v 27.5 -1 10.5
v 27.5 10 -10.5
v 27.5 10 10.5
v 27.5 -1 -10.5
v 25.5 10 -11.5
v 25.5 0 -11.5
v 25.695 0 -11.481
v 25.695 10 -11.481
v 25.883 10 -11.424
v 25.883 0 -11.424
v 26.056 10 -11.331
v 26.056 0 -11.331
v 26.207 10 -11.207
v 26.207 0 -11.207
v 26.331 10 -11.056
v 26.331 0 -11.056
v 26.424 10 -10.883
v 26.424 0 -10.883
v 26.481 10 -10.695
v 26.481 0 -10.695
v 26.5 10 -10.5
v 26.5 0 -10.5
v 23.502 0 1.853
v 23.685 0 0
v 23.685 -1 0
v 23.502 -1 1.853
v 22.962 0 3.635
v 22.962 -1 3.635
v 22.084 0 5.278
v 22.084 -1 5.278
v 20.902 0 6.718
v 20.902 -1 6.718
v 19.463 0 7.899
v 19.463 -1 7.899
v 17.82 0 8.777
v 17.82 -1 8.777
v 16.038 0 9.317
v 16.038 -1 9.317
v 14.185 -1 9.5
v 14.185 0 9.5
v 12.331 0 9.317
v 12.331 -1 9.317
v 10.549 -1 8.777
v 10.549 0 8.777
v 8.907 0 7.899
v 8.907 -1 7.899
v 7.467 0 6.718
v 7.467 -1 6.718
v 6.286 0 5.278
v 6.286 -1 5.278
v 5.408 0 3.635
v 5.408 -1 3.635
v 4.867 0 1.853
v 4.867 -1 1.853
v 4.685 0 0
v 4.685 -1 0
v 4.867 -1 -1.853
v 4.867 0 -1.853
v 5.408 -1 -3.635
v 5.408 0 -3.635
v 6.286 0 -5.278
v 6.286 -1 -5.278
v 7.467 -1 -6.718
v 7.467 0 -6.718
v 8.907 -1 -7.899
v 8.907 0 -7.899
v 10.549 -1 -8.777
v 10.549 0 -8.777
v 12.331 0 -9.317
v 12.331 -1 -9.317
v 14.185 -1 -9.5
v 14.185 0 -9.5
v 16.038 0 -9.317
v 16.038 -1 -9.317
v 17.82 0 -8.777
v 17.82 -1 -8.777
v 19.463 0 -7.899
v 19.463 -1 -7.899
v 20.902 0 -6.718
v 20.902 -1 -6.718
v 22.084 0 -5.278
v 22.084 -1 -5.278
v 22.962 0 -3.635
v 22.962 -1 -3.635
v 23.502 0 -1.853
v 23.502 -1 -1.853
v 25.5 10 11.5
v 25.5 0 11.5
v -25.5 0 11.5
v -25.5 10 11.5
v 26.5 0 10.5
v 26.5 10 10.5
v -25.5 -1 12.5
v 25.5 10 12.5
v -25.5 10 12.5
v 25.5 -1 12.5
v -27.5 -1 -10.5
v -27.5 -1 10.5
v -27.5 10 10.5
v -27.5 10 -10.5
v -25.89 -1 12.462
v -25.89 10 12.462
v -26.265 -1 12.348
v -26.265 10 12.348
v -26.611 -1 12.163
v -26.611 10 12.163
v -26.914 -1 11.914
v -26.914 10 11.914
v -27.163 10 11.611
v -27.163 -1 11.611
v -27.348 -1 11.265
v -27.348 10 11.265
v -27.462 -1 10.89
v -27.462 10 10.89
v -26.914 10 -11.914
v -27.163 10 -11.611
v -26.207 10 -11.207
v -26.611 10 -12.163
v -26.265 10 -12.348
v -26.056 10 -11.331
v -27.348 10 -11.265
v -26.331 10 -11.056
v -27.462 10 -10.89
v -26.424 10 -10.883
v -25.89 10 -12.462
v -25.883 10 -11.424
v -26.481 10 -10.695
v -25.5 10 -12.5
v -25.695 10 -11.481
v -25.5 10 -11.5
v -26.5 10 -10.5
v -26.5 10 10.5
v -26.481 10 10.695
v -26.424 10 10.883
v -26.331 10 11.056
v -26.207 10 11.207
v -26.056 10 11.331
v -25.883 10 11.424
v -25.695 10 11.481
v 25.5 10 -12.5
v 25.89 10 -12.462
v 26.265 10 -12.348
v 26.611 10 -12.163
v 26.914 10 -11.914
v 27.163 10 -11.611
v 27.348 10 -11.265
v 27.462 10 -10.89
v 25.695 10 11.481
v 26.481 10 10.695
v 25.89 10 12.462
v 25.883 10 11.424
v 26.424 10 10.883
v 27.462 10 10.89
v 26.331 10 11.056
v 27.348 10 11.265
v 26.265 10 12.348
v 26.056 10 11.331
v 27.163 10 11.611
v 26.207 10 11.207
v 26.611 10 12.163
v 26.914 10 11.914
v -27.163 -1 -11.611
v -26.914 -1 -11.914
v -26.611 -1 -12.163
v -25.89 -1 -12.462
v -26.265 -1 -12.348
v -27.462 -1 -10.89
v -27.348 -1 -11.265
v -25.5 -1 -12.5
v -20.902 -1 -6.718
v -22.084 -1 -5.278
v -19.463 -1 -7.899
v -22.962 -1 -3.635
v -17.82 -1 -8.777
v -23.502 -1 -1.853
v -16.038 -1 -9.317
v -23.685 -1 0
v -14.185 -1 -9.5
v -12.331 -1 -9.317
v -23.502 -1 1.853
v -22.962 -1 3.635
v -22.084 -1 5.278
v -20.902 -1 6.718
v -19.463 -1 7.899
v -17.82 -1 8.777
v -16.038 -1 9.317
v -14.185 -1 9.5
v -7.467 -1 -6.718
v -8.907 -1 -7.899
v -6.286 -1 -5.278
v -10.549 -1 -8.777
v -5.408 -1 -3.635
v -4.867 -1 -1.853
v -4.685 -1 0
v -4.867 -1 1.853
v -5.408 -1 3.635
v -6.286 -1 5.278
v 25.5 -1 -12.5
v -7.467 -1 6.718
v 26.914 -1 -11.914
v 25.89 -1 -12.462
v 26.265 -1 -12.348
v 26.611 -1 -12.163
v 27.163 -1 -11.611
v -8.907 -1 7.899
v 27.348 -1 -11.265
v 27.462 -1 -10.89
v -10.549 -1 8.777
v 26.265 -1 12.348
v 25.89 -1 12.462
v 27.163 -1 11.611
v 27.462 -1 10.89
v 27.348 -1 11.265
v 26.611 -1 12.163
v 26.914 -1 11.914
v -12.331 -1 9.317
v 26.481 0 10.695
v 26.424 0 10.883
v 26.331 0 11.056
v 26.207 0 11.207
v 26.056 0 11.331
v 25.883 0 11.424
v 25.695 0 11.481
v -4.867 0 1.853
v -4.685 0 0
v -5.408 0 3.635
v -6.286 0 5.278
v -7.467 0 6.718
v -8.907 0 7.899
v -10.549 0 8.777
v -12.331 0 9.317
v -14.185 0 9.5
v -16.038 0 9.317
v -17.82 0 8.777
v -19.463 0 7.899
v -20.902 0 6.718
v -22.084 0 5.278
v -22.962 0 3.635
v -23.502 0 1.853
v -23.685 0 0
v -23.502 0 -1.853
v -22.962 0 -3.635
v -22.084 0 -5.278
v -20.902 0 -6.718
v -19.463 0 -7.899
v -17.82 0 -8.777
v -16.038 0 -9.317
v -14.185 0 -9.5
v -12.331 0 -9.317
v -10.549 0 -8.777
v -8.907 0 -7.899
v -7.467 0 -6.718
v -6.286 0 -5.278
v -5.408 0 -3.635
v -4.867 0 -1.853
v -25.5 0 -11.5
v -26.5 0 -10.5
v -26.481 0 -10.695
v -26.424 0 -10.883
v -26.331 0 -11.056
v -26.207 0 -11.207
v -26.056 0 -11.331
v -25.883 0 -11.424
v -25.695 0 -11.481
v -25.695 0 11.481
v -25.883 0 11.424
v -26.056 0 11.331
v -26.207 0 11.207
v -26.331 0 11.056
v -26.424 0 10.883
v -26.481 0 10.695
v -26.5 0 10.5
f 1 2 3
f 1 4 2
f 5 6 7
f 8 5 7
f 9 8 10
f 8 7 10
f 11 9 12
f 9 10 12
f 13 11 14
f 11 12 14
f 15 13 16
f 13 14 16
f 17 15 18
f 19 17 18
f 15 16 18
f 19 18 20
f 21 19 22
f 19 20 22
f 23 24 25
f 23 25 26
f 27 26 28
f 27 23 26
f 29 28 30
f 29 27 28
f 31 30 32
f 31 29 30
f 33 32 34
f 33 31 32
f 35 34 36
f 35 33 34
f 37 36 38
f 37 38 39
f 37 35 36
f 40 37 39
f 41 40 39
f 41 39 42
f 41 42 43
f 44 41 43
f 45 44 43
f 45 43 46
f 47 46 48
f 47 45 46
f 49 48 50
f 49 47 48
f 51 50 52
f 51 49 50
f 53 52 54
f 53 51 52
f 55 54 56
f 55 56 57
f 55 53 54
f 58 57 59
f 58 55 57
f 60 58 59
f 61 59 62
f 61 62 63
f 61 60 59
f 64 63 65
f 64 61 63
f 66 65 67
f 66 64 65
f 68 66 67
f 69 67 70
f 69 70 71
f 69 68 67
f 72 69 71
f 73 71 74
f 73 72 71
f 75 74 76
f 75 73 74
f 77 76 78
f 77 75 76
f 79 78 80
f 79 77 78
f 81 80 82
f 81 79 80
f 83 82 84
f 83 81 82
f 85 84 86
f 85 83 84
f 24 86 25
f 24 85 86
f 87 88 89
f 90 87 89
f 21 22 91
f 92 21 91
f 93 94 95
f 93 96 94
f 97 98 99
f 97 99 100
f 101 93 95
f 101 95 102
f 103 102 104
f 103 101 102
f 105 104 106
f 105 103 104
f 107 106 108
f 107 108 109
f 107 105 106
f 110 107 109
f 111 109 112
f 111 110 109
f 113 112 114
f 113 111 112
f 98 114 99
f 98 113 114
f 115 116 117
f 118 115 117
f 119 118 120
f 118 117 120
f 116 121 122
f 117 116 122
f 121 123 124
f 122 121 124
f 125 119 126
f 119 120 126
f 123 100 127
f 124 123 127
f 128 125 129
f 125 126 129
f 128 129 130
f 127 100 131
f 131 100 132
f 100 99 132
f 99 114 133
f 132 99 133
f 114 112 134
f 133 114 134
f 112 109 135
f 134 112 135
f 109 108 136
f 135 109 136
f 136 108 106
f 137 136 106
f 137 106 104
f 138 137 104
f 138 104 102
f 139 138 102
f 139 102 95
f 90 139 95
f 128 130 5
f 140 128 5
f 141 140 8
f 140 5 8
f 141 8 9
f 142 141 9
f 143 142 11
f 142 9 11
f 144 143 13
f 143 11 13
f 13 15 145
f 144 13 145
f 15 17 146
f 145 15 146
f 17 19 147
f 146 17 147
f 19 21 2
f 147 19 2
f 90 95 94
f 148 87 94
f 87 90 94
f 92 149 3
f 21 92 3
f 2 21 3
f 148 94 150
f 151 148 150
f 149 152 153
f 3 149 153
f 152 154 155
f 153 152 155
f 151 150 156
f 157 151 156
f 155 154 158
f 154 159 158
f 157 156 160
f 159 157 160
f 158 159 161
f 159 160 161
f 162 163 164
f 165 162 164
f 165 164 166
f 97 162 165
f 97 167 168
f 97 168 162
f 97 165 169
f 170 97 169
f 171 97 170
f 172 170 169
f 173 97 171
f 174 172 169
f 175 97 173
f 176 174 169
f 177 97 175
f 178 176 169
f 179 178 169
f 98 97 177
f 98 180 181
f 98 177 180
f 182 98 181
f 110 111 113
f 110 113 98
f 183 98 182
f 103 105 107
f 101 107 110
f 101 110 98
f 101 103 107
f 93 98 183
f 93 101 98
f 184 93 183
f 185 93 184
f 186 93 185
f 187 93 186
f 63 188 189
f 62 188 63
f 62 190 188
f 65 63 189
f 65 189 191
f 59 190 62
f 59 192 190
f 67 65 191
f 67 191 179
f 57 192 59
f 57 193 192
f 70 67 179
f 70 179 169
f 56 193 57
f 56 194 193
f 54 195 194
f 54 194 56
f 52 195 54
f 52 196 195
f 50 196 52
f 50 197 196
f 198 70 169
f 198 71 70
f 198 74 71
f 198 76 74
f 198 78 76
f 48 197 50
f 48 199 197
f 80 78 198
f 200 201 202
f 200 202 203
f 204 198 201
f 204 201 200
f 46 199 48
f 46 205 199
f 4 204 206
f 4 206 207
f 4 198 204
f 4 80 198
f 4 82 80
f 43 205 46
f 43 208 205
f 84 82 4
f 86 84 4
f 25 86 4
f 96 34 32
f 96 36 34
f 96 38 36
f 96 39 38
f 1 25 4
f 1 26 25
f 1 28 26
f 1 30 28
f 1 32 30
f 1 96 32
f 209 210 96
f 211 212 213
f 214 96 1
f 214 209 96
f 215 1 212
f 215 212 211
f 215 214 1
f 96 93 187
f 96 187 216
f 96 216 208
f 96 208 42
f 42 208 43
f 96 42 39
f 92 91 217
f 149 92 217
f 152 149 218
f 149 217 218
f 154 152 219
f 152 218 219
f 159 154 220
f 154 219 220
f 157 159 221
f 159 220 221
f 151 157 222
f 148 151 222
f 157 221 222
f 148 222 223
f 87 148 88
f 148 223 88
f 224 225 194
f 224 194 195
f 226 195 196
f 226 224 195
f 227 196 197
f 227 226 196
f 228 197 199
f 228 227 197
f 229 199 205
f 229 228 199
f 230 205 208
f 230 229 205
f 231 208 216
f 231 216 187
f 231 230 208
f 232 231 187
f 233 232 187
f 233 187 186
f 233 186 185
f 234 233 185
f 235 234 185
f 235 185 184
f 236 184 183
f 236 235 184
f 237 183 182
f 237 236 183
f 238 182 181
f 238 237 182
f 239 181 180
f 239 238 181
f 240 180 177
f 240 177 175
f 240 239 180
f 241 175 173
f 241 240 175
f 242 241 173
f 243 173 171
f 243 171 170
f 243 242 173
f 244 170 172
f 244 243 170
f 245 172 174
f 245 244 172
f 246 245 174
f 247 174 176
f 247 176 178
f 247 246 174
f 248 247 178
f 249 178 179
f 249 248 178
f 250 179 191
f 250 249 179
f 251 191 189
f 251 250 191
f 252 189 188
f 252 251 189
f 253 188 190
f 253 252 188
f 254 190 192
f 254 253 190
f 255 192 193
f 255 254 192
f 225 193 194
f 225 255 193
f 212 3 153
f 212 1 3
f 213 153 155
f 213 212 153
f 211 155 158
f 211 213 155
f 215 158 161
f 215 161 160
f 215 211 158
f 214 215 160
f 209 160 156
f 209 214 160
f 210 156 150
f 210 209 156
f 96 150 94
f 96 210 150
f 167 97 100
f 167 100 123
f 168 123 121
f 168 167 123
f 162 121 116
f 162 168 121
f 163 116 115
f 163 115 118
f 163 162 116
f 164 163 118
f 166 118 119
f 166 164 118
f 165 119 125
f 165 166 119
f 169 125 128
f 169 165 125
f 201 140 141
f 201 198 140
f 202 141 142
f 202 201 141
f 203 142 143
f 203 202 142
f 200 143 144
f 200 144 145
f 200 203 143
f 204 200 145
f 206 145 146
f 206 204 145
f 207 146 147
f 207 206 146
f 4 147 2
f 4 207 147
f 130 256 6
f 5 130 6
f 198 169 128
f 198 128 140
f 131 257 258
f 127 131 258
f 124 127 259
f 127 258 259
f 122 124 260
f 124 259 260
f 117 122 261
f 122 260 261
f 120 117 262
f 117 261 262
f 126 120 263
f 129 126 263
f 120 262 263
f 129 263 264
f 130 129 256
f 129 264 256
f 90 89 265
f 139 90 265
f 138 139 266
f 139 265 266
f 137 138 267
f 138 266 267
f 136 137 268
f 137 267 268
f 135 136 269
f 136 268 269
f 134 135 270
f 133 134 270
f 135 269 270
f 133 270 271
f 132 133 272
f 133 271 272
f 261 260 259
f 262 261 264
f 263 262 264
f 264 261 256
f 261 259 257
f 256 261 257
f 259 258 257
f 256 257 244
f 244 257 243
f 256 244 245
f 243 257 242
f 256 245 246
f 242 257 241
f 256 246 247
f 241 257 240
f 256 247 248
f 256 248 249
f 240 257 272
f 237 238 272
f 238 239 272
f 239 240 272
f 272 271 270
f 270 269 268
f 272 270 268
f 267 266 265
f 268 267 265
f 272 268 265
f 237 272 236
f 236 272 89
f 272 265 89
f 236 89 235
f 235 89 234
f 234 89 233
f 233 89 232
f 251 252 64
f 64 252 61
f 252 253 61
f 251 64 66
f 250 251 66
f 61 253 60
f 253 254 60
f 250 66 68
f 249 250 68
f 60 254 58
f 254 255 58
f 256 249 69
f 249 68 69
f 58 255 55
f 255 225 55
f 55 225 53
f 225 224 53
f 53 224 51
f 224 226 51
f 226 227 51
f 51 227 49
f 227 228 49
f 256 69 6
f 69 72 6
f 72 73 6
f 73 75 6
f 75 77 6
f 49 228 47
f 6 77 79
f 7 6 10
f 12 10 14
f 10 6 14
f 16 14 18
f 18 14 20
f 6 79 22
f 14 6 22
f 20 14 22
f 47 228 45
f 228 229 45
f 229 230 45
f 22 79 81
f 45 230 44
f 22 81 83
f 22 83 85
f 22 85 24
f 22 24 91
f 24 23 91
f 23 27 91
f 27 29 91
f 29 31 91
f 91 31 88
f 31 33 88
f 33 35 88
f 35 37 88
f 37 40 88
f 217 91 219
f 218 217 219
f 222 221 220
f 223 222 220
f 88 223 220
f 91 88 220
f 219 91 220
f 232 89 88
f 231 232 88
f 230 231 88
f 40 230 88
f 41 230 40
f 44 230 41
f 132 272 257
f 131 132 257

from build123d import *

# Parameters (mm, degrees)
F0_R     = 9.5
F1_DEPTH = 1
F3_DEPTH = 10
F4_DEPTH = 35.9


with BuildPart() as f1:
    # F0 (on Front) → F1 (new body)
    with BuildSketch(Plane.XZ):
        with BuildLine():
            Line((25.5, 12.5), (-25.5, 12.5))
            ThreePointArc((-25.5, 12.5), (-26.914214, 11.914214), (-27.5, 10.5))
            Line((-27.5, 10.5), (-27.5, -10.5))
            ThreePointArc((-27.5, -10.5), (-26.914214, -11.914214), (-25.5, -12.5))
            Line((-25.5, -12.5), (25.5, -12.5))
            ThreePointArc((25.5, -12.5), (26.914214, -11.914214), (27.5, -10.5))
            Line((27.5, -10.5), (27.5, 10.5))
            ThreePointArc((27.5, 10.5), (26.914214, 11.914214), (25.5, 12.5))
        make_face()
        with Locations((-14.184796, 0)):
            Circle(F0_R, mode=Mode.SUBTRACT)
        with Locations((14.184796, 0)):
            Circle(F0_R, mode=Mode.SUBTRACT)
    extrude(amount=F1_DEPTH)

    # F0 (on Front) → F3 (join)
    with BuildSketch(Plane.XZ):
        with BuildLine():
            Line((25.5, 12.5), (-25.5, 12.5))
            ThreePointArc((-25.5, 12.5), (-26.914214, 11.914214), (-27.5, 10.5))
            Line((-27.5, 10.5), (-27.5, -10.5))
            ThreePointArc((-27.5, -10.5), (-26.914214, -11.914214), (-25.5, -12.5))
            Line((-25.5, -12.5), (25.5, -12.5))
            ThreePointArc((25.5, -12.5), (26.914214, -11.914214), (27.5, -10.5))
            Line((27.5, -10.5), (27.5, 10.5))
            ThreePointArc((27.5, 10.5), (26.914214, 11.914214), (25.5, 12.5))
        make_face()
        with Locations((-14.184796, 0)):
            Circle(F0_R, mode=Mode.SUBTRACT)
        with Locations((14.184796, 0)):
            Circle(F0_R, mode=Mode.SUBTRACT)
    extrude(amount=-F3_DEPTH)

    # F2 (on Front) → F4 (cut)
    with BuildSketch(Plane.XZ):
        with BuildLine():
            ThreePointArc((26.5, 10.5), (26.207107, 11.207107), (25.5, 11.5))
            Line((25.5, 11.5), (-25.5, 11.5))
            ThreePointArc((-25.5, 11.5), (-26.207107, 11.207107), (-26.5, 10.5))
            Line((-26.5, 10.5), (-26.5, -10.5))
            ThreePointArc((-26.5, -10.5), (-26.207107, -11.207107), (-25.5, -11.5))
            Line((-25.5, -11.5), (25.5, -11.5))
            ThreePointArc((25.5, -11.5), (26.207107, -11.207107), (26.5, -10.5))
            Line((26.5, -10.5), (26.5, 10.5))
        make_face()
    extrude(amount=-F4_DEPTH, mode=Mode.SUBTRACT)


solid = f1.part
